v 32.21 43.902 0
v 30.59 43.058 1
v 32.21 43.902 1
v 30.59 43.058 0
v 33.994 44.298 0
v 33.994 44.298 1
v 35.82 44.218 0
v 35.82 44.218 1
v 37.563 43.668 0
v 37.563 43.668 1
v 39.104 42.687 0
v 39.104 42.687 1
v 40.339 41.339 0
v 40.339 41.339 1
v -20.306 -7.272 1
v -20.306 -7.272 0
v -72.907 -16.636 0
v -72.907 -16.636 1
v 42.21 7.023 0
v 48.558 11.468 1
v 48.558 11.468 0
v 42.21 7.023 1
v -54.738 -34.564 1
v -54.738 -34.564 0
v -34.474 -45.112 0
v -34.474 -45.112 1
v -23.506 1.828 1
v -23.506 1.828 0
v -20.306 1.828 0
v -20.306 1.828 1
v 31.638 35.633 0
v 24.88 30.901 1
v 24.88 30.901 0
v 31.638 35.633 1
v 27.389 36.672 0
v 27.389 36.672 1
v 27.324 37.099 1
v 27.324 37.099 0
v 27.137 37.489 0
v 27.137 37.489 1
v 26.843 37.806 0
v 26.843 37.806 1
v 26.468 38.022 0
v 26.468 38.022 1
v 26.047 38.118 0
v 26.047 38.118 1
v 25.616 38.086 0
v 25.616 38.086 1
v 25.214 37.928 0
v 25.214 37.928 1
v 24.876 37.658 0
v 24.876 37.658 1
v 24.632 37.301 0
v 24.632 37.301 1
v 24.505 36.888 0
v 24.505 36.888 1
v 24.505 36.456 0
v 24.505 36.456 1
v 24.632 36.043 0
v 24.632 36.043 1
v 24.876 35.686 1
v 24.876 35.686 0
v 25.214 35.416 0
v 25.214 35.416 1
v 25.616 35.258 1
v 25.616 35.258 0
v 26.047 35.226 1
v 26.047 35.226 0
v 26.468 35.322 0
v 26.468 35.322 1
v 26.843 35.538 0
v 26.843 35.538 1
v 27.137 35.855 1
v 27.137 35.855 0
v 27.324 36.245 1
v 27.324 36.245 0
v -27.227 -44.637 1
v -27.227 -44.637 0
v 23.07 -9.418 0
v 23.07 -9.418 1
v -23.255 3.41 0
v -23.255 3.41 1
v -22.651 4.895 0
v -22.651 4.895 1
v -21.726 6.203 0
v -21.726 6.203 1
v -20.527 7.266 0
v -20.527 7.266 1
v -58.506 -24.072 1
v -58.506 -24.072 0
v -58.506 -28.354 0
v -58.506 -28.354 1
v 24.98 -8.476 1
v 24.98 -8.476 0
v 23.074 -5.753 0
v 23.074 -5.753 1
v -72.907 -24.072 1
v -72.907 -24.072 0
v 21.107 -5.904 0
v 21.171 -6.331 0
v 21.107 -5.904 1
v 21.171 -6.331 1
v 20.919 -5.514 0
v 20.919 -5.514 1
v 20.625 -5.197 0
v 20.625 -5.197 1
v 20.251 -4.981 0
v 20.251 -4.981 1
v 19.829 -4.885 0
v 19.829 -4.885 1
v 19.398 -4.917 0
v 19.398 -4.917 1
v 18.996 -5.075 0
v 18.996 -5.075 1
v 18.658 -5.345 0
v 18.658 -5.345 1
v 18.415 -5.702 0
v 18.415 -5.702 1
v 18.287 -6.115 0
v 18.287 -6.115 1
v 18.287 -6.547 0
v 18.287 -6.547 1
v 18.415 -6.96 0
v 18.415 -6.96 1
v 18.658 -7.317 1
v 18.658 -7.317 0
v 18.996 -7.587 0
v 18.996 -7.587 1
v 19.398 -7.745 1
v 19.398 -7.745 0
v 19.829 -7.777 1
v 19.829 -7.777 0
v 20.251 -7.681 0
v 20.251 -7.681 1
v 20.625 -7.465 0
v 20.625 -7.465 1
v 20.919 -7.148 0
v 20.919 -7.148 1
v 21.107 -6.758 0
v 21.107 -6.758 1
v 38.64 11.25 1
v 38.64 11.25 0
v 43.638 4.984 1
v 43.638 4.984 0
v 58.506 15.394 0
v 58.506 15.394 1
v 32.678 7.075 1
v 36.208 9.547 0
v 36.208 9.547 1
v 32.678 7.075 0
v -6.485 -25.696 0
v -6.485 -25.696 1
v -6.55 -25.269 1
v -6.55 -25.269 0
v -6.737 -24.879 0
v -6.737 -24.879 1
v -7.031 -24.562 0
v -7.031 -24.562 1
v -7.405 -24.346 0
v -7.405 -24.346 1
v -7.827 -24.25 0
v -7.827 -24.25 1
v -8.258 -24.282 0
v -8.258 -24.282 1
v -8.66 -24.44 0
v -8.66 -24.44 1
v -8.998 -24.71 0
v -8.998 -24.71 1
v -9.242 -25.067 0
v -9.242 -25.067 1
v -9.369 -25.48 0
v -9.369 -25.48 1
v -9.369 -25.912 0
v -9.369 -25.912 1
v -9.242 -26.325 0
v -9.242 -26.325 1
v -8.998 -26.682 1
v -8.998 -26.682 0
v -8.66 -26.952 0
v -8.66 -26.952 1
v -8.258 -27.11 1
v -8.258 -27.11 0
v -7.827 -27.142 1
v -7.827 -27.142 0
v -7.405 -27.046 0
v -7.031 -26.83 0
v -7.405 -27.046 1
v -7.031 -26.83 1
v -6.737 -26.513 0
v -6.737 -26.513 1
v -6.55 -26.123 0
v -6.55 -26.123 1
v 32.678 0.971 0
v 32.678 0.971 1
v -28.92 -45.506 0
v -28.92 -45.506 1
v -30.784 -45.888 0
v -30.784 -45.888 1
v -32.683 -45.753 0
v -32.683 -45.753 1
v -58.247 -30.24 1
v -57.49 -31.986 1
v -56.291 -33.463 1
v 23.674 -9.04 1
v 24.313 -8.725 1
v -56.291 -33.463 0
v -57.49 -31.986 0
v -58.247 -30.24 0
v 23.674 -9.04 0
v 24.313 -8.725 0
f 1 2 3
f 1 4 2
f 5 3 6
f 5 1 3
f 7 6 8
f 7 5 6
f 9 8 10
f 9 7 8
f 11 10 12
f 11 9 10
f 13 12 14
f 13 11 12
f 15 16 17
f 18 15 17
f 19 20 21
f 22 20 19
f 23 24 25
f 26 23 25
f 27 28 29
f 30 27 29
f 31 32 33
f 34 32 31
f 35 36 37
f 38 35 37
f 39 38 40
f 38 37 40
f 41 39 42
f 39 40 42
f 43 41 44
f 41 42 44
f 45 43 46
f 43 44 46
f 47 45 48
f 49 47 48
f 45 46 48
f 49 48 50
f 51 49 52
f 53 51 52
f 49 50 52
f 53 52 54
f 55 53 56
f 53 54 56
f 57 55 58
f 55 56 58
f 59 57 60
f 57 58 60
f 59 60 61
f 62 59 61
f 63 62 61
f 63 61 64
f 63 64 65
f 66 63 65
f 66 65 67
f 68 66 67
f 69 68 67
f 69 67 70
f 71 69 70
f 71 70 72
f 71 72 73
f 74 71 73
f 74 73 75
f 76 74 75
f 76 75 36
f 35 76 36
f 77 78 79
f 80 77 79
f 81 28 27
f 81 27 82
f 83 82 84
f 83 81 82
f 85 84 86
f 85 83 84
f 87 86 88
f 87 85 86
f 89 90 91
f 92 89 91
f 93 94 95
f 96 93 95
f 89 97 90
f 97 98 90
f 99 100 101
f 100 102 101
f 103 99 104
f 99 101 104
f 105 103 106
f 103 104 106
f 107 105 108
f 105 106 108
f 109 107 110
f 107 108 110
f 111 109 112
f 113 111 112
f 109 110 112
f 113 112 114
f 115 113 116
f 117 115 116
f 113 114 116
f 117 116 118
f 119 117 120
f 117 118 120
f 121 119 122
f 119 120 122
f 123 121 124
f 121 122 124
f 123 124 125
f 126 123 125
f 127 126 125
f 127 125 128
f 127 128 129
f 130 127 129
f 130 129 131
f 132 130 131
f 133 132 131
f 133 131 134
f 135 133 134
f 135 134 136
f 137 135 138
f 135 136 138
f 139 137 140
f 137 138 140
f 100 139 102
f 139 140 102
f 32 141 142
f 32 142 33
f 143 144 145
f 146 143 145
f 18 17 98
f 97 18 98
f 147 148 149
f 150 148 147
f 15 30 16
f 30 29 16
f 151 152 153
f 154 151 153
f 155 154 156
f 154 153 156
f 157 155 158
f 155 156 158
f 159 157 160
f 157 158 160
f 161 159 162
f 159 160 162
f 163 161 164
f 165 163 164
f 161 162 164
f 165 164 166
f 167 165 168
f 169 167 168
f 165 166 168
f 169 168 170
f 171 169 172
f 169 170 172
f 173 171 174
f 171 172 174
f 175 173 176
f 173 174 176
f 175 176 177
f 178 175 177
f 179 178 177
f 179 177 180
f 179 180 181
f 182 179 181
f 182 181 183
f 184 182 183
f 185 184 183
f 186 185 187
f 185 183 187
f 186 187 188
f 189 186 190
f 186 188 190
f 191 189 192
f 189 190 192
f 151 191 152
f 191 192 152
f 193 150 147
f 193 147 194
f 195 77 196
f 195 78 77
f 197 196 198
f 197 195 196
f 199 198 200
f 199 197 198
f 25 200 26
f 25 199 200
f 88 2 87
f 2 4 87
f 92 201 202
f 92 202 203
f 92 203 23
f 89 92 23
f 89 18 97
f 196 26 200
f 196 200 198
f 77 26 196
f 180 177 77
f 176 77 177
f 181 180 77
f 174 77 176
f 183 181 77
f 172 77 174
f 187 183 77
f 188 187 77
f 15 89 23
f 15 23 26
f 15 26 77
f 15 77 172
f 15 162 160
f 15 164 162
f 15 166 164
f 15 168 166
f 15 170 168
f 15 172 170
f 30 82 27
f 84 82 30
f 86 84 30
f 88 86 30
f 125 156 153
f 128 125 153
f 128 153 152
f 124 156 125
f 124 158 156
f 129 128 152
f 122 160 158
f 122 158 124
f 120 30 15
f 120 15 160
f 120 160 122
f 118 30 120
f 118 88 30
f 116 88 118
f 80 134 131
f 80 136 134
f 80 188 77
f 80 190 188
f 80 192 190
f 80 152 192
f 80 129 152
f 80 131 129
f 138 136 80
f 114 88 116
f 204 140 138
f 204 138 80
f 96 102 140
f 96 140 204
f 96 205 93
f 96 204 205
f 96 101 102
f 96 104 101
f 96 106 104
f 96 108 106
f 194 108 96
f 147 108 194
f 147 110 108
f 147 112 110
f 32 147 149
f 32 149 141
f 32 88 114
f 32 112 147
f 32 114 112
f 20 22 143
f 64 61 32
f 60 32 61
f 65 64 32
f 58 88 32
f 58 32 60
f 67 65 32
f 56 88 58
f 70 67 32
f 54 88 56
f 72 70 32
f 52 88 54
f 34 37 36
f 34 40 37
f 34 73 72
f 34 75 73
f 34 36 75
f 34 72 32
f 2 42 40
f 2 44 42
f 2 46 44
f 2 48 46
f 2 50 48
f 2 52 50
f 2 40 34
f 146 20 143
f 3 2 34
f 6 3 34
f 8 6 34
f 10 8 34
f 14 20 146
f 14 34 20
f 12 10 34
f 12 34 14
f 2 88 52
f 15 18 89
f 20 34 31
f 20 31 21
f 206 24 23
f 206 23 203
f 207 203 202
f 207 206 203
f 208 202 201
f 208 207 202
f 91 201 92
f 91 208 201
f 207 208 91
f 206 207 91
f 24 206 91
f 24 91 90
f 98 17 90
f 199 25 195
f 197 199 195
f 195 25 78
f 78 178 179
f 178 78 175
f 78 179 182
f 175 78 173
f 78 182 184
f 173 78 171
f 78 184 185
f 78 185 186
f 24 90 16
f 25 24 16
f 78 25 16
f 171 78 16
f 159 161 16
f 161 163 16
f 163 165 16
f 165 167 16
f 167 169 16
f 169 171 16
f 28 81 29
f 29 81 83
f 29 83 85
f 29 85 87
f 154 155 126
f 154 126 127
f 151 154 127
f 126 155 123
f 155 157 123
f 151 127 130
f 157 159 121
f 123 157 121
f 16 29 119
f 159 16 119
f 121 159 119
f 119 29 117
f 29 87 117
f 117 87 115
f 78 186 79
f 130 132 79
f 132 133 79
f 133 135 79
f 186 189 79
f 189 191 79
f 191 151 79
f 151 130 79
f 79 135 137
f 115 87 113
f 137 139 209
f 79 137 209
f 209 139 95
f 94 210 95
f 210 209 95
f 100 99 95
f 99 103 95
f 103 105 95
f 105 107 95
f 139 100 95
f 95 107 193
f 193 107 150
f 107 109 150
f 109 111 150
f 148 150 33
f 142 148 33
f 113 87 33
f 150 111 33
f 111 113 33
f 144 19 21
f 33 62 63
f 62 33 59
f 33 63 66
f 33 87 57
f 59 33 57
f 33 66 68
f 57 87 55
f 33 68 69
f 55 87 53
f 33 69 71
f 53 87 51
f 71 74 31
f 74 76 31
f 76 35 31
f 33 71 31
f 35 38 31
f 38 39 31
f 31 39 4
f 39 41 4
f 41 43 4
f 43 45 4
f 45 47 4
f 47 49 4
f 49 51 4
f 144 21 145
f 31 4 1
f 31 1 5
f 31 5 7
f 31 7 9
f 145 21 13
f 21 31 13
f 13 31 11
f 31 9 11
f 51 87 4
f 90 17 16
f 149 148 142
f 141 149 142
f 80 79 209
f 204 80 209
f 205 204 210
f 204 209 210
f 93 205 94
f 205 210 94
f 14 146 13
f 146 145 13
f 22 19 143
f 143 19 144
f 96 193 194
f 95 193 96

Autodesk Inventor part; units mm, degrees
ref_plane "YZ Plane" through (0, 0, 0) normal (1, 0, 0) x (0, 1, 0)
ref_plane "XZ Plane" through (0, 0, 0) normal (0, 1, 0) x (-1, 0, 0)
ref_plane "XY Plane" through (0, 0, 0) normal (0, 0, 1) x (1, 0, 0)
ref_plane "Work Plane1" through (0, 0, 0) normal (0, 0, 1) x (1, 0, 0)
sketch "Sketch1" plane through (0, 0, 0) normal (0, 0, 1) x (1, 0, 0)
  arc A0 (-7.9352, -23.1681) -> (-8.7998, -28.0716) centre (-7.9352, -25.6961) ccw projected
  line L0 (-8.7998, -28.0716) -> (-27.4567, -41.1353) projected
  arc A1 (-34.704, -41.6104) -> (-27.4567, -41.1353) centre (-31.4718, -35.4013) ccw projected
  line L1 (-34.704, -41.6104) -> (-51.738, -32.743) projected
  arc A2 (-55.5058, -26.5339) -> (-51.738, -32.743) centre (-48.5058, -26.5339) ccw projected
  line L2 (-55.5058, -26.5339) -> (-55.5058, -22.4494) projected
  arc A3 (-49.7326, -15.5577) -> (-55.5058, -22.4494) centre (-48.5058, -22.4494) ccw projected
  line L3 (-49.7326, -15.5577) -> (-17.3058, -9.7854) projected
  line L4 (-17.3058, -9.7854) -> (-7.9352, -23.1681) projected
  line L5 (24.8783, -8.1523) -> (23.0703, -5.7559) projected
  line L6 (23.0703, -5.7559) -> (22.5789, -6.1) projected
  arc A4 (22.5789, -6.1) -> (17.1147, -5.1366) centre (19.7211, -6.3309) ccw projected
  line L7 (17.1147, -5.1366) -> (18.5334, -7.1626) projected
  circle A5 centre (19.7211, -6.3309) radius 1.45 projected
  line L8 (18.5334, -7.1626) -> (19.2274, -8.1539) projected
  line L9 (19.2274, -8.1539) -> (-1.2514, -22.4933) projected
  line L10 (-1.2514, -22.4933) -> (-17.3116, 0.4431) projected
  line L11 (3.5665, 15.0622) -> (-17.3116, 0.4431) projected
  arc A6 (6.3584, 22.4292) -> (3.5665, 15.0622) centre (10.3734, 16.6951) ccw projected
  line L12 (6.3584, 22.4292) -> (14.6012, 28.2009) projected
  arc A7 (24.3503, 26.4818) -> (14.6012, 28.2009) centre (18.6163, 22.4668) ccw projected
  line L13 (24.3503, 26.4818) -> (36.2081, 9.5471) projected
  line L14 (36.2081, 9.5471) -> (39.0496, 11.5367) projected
  line L15 (39.0496, 11.5367) -> (25.5762, 30.7786) projected
  line L16 (25.5762, 30.7786) -> (31.5151, 34.937) projected
  line L17 (31.5151, 34.937) -> (47.862, 11.5912) projected
  line L18 (47.862, 11.5912) -> (41.9232, 7.4328) projected
  line L19 (41.9232, 7.4328) -> (43.6382, 4.9835) projected
  line L20 (43.6382, 4.9835) -> (58.5058, 15.3939) projected
  line L21 (58.5058, 15.3939) -> (40.3386, 41.3393) projected
  arc A8 (40.3386, 41.3393) -> (30.5895, 43.0583) centre (34.6046, 37.3243) ccw projected
  line L22 (30.5895, 43.0583) -> (-20.5271, 7.2661) projected
  arc A9 (-20.5271, 7.2661) -> (-23.5058, 1.8277) centre (-16.512, 1.532) ccw projected
  line L23 (-23.5058, 1.8277) -> (-20.3058, 1.8277) projected
  line L24 (-20.3058, 1.8277) -> (-20.3058, -7.2723) projected
  line L25 (-20.3058, -7.2723) -> (-72.9074, -16.6359) projected
  line L26 (-72.9074, -16.6359) -> (-72.9074, -24.0723) projected
  line L27 (-72.9074, -24.0723) -> (-58.5058, -24.0723) projected
  line L28 (-58.5058, -24.0723) -> (-58.5058, -28.3544) projected
  arc A10 (-58.5058, -28.3544) -> (-54.738, -34.5635) centre (-51.5058, -28.3544) ccw projected
  line L29 (-54.738, -34.5635) -> (-34.4745, -45.112) projected
  arc A11 (-34.4745, -45.112) -> (-27.2272, -44.637) centre (-31.2423, -38.9029) ccw projected
  line L30 (-27.2272, -44.637) -> (23.0703, -9.4182) projected
  arc A12 (27.0854, -8.1523) -> (23.0703, -9.4182) centre (27.0854, -15.1523) ccw projected
  line L31 (24.8783, -8.1523) -> (27.0854, -8.1523) projected
  circle A13 centre (-7.9352, -25.6961) radius 1.45 projected
  circle A14 centre (25.9387, 36.6719) radius 1.45 projected
  line L32 (24.8783, -8.1523) -> (35.6777, -8.1523) projected
  line L33 (35.6777, -8.1523) -> (35.6777, 3.8477) construction
  line L34 (35.6777, 3.8477) -> (95.6777, 3.8477) construction
  line L35 (95.6777, 3.8477) -> (95.6777, 15.3939) projected
  line L36 (95.6777, 15.3939) -> (58.5058, 15.3939) projected
  line L37 (58.5058, 15.3939) -> (43.6382, 4.9835) projected
  line L38 (43.6382, 4.9835) -> (39.0496, 11.5367) projected
  line L39 (39.0496, 11.5367) -> (32.6777, 7.0751) projected
  line L40 (32.6777, 7.0751) -> (32.6777, 0.9712) projected
  line L41 (32.6777, 0.9712) -> (23.0703, -5.7559) projected
  line L42 (23.0703, -5.7559) -> (24.8783, -8.1523) projected
  line L43 (24.9804, -8.4763) -> (23.0739, -5.7534)
  line L44 (23.0739, -5.7534) -> (32.6777, 0.9712)
  line L45 (32.6777, 0.9712) -> (32.6777, 7.0751)
  line L46 (32.6777, 7.0751) -> (39.0496, 11.5367)
  line L47 (39.0496, 11.5367) -> (43.6382, 4.9835)
  line L48 (43.6382, 4.9835) -> (58.5058, 15.3939)
extrude "Extrusion1" add sketch "Sketch1" along normal blind 1 contours A0 L0 A1 L1 A2 L2 A3 L3 L4 | A5 | L43 A12 L30 A11 L29 A10 L28 L27 L26 L25 L24 L23 A9 L22 A8 L21 L20 L19 L18 L17 L16 L15 L14 L13 A7 L12 A6 L11 L10 L9 L8 L7 A4 L6 L5 | L5 L41 L43 | L6 A4 L7 L8 L9 L10 L11 A6 L12 A7 L13 L39 L40 L41 | L15 L16 L17 L18 L38 | A13 | A14
sketch "Sketch2" plane through (0, 0, 1) normal (0, 0, 1) x (1, 0, 0)
  arc A0 (24.9804, -8.4763) -> (23.0703, -9.4182) centre (27.0854, -15.1523) ccw projected
  line L0 (24.9804, -8.4763) -> (23.0739, -5.7534) projected
  line L1 (23.0739, -5.7534) -> (32.6777, 0.9712) projected
  line L2 (32.6777, 0.9712) -> (32.6777, 7.0751) projected
  line L3 (32.6777, 7.0751) -> (39.0496, 11.5367) projected
  line L4 (39.0496, 11.5367) -> (43.6382, 4.9835) projected
  line L5 (43.6382, 4.9835) -> (58.5058, 15.3939) projected
  line L6 (58.5058, 15.3939) -> (40.3386, 41.3393) projected
  arc A1 (40.3386, 41.3393) -> (30.5895, 43.0583) centre (34.6046, 37.3243) ccw projected
  line L7 (30.5895, 43.0583) -> (-20.5271, 7.2661) projected
  arc A2 (-20.5271, 7.2661) -> (-23.5058, 1.8277) centre (-16.512, 1.532) ccw projected
  line L8 (-23.5058, 1.8277) -> (-20.3058, 1.8277) projected
  line L9 (-20.3058, 1.8277) -> (-20.3058, -7.2723) projected
  line L10 (-20.3058, -7.2723) -> (-72.9074, -16.6359) projected
  line L11 (-72.9074, -16.6359) -> (-72.9074, -24.0723) projected
  line L12 (-72.9074, -24.0723) -> (-58.5058, -24.0723) projected
  line L13 (-58.5058, -24.0723) -> (-58.5058, -28.3544) projected
  arc A3 (-58.5058, -28.3544) -> (-54.738, -34.5635) centre (-51.5058, -28.3544) ccw projected
  line L14 (-54.738, -34.5635) -> (-34.4745, -45.112) projected
  arc A4 (-34.4745, -45.112) -> (-27.2272, -44.637) centre (-31.2423, -38.9029) ccw projected
  line L15 (-27.2272, -44.637) -> (23.0703, -9.4182) projected
  circle A5 centre (25.9387, 36.6719) radius 1.45 projected
  circle A6 centre (-7.9352, -25.6961) radius 1.45 projected
  circle A7 centre (19.7211, -6.3309) radius 1.45 projected
  point P0 (0, 0)
extrude "Extrusion2" cut sketch "Sketch2" against normal blind 1 contours A5 | A6 | A7
sketch "Sketch3" plane through (0, 0, 1) normal (0, 0, 1) x (1, 0, 0)
  line L0 (47.862, 11.5912) -> (31.5151, 34.937) projected
  line L1 (31.5151, 34.937) -> (25.5762, 30.7786) projected
  line L2 (41.9232, 7.4328) -> (25.5762, 30.7786) projected
  line L3 (47.862, 11.5912) -> (41.9232, 7.4328) projected
  line L4 (31.6379, 35.6334) -> (48.5584, 11.4684)
  line L5 (48.5584, 11.4684) -> (41.8004, 6.7364)
  line L6 (41.8004, 6.7364) -> (24.8799, 30.9014)
  line L7 (24.8799, 30.9014) -> (31.6379, 35.6334)
  point P0 (0, 0)
  dimension "d4" = 0.5
extrude "Extrusion3" cut sketch "Sketch3" against normal through all contours L3 L2 L1 L0 | L4 L5 L6 L7
properties part number "cellSTORM_inverted_opticsmodule_lid"
